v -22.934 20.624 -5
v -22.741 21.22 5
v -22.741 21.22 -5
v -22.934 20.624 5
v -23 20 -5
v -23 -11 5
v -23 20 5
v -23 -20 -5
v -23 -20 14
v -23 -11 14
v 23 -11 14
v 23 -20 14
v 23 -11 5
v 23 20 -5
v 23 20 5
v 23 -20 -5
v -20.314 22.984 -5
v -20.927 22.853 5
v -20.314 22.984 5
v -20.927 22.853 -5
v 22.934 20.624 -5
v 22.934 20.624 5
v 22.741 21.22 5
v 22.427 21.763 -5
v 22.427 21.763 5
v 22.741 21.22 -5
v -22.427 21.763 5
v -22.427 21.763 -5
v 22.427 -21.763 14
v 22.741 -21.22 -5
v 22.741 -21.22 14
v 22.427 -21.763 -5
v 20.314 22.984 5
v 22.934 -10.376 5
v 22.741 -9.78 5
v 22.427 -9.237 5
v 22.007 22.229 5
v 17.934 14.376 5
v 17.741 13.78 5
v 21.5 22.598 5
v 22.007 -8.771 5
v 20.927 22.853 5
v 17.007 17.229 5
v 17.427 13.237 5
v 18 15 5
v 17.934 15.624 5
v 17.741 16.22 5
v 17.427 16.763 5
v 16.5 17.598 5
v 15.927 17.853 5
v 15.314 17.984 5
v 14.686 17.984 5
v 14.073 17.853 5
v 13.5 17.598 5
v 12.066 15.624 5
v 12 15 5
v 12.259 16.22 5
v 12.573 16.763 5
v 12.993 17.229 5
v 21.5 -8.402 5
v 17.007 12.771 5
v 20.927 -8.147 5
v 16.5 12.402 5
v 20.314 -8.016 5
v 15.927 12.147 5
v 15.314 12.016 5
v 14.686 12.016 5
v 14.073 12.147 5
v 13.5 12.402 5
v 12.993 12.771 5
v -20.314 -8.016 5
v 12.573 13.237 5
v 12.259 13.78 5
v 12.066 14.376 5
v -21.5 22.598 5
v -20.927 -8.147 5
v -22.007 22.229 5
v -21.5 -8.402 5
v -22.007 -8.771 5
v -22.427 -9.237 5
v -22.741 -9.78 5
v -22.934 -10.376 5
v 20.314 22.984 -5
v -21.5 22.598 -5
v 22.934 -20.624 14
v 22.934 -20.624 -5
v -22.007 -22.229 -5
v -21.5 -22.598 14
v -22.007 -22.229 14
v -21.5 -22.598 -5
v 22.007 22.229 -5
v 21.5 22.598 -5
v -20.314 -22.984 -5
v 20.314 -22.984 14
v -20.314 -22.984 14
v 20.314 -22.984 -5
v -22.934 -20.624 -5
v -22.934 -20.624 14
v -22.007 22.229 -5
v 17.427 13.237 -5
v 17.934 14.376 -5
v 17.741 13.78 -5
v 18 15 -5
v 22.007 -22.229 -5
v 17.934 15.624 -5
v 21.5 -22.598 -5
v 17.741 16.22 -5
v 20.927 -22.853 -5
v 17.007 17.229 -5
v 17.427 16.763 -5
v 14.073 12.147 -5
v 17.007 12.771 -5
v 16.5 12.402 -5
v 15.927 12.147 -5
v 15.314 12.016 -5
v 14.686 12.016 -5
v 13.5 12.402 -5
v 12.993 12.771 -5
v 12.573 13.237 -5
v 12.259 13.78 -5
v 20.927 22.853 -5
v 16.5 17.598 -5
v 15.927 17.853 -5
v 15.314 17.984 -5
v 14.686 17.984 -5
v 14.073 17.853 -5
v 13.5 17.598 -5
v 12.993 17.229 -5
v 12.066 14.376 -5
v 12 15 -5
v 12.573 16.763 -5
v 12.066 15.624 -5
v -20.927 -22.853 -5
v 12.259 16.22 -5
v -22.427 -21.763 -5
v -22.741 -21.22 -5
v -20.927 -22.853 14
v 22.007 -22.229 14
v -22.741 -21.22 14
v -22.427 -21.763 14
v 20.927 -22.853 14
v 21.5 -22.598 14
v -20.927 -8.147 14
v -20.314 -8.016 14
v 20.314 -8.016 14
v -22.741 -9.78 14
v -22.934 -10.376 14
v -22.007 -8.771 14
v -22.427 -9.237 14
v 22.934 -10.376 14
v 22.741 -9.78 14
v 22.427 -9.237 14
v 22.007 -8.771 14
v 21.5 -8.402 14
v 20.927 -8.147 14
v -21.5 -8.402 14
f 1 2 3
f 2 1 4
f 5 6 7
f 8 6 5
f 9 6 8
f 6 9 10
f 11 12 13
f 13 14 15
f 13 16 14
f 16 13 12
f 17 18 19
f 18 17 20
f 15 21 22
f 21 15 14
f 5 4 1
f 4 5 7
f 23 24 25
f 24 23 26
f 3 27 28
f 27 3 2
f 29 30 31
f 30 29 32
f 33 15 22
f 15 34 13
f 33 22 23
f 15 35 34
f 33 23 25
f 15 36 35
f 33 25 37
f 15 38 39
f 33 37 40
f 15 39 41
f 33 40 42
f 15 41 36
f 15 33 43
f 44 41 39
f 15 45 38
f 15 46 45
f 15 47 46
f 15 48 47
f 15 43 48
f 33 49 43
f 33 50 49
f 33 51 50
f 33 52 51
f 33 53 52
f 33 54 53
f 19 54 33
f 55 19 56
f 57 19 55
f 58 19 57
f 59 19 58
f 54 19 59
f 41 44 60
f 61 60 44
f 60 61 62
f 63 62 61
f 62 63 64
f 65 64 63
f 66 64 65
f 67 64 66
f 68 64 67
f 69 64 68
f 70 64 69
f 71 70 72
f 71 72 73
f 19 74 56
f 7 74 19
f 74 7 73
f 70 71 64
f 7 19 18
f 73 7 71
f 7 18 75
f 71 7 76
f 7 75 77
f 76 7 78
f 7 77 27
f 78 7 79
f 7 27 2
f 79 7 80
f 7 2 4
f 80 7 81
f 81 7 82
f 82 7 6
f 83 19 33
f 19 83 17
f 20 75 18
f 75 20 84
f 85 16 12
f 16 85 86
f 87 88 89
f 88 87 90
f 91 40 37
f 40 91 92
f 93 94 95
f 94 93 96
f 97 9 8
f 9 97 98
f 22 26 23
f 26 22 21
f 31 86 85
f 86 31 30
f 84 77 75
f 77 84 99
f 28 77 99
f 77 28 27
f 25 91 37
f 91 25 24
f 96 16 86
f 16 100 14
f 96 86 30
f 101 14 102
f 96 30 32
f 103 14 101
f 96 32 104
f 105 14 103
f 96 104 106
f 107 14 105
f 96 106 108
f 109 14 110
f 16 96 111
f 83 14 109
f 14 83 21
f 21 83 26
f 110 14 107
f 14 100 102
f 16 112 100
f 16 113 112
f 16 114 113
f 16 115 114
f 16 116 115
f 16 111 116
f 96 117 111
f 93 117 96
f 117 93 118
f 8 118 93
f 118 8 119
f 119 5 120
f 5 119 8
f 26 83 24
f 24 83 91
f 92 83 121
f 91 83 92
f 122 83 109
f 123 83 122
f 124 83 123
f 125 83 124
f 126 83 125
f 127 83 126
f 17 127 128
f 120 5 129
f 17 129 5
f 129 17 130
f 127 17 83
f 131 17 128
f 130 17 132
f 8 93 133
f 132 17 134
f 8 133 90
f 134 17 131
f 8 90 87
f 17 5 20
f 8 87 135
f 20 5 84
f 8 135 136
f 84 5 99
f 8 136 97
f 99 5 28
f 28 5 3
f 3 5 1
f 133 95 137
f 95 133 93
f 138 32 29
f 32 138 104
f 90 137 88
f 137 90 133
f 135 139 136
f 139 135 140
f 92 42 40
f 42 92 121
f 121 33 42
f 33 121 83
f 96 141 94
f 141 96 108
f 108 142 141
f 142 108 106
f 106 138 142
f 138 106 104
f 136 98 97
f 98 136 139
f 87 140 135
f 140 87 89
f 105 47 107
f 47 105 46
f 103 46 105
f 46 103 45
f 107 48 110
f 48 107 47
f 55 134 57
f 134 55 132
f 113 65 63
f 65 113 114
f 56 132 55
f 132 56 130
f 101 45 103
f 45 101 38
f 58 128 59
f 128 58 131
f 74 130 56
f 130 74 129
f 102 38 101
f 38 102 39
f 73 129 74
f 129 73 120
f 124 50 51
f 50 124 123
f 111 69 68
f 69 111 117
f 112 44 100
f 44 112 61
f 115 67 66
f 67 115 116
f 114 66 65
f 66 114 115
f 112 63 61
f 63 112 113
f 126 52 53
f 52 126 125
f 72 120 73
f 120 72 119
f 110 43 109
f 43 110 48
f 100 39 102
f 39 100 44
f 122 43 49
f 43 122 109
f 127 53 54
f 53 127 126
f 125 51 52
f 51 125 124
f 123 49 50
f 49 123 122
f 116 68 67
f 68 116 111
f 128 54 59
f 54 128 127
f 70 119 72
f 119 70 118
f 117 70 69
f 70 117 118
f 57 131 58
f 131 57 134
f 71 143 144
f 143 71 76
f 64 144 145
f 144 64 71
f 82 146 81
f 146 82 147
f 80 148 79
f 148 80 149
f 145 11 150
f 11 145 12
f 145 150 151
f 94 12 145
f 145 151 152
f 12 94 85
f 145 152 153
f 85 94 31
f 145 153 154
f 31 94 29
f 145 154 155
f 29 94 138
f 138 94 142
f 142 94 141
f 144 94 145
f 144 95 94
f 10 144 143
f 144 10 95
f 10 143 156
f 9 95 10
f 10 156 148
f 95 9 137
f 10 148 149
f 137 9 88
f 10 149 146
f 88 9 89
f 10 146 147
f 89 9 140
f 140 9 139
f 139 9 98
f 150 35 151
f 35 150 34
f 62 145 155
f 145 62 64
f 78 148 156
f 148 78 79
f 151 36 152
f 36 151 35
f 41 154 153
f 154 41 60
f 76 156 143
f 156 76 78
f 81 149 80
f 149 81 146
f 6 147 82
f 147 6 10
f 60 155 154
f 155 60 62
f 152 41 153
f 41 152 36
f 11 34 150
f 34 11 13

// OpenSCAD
$fn = 30;


//edge();
//corner();
//botplate();

edge2();
//corner2();
botplate2();

module edge2(){
	translate([0,-15.5,9]) plate(40, 9, 10);
}

module corner2(){
	difference(){
		union(){
			translate([-15.5,0,9]) plate(9, 40, 10);
			translate([0,-15.5,9]) plate(40, 9, 10);
		}
		translate([-6,-6,10]) cylinder(h = 20,d = 10,center=true);
	}
}

module botplate2(){
	difference(){
		color("RED") plate(40, 40, 10 );
		translate([15,15,0]) cylinder(h = 20,d = 6,center=true);
	}
}

module botplate(){
	difference(){
		color("RED") plate(80, 80, 10 );
		translate([20,20,0]) boltHolePattern();
	}
}

module edge(){
	translate([0,-35.5,9]) plate(80, 9, 10);
}

module corner(){
	difference(){
		union(){
			translate([-35.5,0,9]) plate(9, 80, 10);
			translate([0,-35.5,9]) plate(80, 9, 10);
		}
		translate([-26,-26,10]) cylinder(h = 20,d = 10,center=true);
	}
}
//translate([-27,-27,0]) cylinder(h = 20,d = 4,center=true);

module boltHolePattern(){

	$width = 27;
	$holeSize = 6;
	$height = 20;

	translate([ ($width/2), ($width/2),0]) cylinder(h = $height,d = $holeSize,center=true);
	translate([ ($width/2),-($width/2),0]) cylinder(h = $height,d = $holeSize,center=true);
	translate([(-$width/2), ($width/2),0]) cylinder(h = $height,d = $holeSize,center=true);
	translate([-($width/2),-($width/2),0]) cylinder(h = $height,d = $holeSize,center=true);

}

module plate($width,$depth, $height){

	$size = 6;
	hull(){
		translate([ ($width/2), ($depth/2),0]) cylinder(h = $height,d = $size,center=true);
		translate([ ($width/2),-($depth/2),0]) cylinder(h = $height,d = $size,center=true);
		translate([(-$width/2), ($depth/2),0]) cylinder(h = $height,d = $size,center=true);
		translate([-($width/2),-($depth/2),0]) cylinder(h = $height,d = $size,center=true);
	}

}
